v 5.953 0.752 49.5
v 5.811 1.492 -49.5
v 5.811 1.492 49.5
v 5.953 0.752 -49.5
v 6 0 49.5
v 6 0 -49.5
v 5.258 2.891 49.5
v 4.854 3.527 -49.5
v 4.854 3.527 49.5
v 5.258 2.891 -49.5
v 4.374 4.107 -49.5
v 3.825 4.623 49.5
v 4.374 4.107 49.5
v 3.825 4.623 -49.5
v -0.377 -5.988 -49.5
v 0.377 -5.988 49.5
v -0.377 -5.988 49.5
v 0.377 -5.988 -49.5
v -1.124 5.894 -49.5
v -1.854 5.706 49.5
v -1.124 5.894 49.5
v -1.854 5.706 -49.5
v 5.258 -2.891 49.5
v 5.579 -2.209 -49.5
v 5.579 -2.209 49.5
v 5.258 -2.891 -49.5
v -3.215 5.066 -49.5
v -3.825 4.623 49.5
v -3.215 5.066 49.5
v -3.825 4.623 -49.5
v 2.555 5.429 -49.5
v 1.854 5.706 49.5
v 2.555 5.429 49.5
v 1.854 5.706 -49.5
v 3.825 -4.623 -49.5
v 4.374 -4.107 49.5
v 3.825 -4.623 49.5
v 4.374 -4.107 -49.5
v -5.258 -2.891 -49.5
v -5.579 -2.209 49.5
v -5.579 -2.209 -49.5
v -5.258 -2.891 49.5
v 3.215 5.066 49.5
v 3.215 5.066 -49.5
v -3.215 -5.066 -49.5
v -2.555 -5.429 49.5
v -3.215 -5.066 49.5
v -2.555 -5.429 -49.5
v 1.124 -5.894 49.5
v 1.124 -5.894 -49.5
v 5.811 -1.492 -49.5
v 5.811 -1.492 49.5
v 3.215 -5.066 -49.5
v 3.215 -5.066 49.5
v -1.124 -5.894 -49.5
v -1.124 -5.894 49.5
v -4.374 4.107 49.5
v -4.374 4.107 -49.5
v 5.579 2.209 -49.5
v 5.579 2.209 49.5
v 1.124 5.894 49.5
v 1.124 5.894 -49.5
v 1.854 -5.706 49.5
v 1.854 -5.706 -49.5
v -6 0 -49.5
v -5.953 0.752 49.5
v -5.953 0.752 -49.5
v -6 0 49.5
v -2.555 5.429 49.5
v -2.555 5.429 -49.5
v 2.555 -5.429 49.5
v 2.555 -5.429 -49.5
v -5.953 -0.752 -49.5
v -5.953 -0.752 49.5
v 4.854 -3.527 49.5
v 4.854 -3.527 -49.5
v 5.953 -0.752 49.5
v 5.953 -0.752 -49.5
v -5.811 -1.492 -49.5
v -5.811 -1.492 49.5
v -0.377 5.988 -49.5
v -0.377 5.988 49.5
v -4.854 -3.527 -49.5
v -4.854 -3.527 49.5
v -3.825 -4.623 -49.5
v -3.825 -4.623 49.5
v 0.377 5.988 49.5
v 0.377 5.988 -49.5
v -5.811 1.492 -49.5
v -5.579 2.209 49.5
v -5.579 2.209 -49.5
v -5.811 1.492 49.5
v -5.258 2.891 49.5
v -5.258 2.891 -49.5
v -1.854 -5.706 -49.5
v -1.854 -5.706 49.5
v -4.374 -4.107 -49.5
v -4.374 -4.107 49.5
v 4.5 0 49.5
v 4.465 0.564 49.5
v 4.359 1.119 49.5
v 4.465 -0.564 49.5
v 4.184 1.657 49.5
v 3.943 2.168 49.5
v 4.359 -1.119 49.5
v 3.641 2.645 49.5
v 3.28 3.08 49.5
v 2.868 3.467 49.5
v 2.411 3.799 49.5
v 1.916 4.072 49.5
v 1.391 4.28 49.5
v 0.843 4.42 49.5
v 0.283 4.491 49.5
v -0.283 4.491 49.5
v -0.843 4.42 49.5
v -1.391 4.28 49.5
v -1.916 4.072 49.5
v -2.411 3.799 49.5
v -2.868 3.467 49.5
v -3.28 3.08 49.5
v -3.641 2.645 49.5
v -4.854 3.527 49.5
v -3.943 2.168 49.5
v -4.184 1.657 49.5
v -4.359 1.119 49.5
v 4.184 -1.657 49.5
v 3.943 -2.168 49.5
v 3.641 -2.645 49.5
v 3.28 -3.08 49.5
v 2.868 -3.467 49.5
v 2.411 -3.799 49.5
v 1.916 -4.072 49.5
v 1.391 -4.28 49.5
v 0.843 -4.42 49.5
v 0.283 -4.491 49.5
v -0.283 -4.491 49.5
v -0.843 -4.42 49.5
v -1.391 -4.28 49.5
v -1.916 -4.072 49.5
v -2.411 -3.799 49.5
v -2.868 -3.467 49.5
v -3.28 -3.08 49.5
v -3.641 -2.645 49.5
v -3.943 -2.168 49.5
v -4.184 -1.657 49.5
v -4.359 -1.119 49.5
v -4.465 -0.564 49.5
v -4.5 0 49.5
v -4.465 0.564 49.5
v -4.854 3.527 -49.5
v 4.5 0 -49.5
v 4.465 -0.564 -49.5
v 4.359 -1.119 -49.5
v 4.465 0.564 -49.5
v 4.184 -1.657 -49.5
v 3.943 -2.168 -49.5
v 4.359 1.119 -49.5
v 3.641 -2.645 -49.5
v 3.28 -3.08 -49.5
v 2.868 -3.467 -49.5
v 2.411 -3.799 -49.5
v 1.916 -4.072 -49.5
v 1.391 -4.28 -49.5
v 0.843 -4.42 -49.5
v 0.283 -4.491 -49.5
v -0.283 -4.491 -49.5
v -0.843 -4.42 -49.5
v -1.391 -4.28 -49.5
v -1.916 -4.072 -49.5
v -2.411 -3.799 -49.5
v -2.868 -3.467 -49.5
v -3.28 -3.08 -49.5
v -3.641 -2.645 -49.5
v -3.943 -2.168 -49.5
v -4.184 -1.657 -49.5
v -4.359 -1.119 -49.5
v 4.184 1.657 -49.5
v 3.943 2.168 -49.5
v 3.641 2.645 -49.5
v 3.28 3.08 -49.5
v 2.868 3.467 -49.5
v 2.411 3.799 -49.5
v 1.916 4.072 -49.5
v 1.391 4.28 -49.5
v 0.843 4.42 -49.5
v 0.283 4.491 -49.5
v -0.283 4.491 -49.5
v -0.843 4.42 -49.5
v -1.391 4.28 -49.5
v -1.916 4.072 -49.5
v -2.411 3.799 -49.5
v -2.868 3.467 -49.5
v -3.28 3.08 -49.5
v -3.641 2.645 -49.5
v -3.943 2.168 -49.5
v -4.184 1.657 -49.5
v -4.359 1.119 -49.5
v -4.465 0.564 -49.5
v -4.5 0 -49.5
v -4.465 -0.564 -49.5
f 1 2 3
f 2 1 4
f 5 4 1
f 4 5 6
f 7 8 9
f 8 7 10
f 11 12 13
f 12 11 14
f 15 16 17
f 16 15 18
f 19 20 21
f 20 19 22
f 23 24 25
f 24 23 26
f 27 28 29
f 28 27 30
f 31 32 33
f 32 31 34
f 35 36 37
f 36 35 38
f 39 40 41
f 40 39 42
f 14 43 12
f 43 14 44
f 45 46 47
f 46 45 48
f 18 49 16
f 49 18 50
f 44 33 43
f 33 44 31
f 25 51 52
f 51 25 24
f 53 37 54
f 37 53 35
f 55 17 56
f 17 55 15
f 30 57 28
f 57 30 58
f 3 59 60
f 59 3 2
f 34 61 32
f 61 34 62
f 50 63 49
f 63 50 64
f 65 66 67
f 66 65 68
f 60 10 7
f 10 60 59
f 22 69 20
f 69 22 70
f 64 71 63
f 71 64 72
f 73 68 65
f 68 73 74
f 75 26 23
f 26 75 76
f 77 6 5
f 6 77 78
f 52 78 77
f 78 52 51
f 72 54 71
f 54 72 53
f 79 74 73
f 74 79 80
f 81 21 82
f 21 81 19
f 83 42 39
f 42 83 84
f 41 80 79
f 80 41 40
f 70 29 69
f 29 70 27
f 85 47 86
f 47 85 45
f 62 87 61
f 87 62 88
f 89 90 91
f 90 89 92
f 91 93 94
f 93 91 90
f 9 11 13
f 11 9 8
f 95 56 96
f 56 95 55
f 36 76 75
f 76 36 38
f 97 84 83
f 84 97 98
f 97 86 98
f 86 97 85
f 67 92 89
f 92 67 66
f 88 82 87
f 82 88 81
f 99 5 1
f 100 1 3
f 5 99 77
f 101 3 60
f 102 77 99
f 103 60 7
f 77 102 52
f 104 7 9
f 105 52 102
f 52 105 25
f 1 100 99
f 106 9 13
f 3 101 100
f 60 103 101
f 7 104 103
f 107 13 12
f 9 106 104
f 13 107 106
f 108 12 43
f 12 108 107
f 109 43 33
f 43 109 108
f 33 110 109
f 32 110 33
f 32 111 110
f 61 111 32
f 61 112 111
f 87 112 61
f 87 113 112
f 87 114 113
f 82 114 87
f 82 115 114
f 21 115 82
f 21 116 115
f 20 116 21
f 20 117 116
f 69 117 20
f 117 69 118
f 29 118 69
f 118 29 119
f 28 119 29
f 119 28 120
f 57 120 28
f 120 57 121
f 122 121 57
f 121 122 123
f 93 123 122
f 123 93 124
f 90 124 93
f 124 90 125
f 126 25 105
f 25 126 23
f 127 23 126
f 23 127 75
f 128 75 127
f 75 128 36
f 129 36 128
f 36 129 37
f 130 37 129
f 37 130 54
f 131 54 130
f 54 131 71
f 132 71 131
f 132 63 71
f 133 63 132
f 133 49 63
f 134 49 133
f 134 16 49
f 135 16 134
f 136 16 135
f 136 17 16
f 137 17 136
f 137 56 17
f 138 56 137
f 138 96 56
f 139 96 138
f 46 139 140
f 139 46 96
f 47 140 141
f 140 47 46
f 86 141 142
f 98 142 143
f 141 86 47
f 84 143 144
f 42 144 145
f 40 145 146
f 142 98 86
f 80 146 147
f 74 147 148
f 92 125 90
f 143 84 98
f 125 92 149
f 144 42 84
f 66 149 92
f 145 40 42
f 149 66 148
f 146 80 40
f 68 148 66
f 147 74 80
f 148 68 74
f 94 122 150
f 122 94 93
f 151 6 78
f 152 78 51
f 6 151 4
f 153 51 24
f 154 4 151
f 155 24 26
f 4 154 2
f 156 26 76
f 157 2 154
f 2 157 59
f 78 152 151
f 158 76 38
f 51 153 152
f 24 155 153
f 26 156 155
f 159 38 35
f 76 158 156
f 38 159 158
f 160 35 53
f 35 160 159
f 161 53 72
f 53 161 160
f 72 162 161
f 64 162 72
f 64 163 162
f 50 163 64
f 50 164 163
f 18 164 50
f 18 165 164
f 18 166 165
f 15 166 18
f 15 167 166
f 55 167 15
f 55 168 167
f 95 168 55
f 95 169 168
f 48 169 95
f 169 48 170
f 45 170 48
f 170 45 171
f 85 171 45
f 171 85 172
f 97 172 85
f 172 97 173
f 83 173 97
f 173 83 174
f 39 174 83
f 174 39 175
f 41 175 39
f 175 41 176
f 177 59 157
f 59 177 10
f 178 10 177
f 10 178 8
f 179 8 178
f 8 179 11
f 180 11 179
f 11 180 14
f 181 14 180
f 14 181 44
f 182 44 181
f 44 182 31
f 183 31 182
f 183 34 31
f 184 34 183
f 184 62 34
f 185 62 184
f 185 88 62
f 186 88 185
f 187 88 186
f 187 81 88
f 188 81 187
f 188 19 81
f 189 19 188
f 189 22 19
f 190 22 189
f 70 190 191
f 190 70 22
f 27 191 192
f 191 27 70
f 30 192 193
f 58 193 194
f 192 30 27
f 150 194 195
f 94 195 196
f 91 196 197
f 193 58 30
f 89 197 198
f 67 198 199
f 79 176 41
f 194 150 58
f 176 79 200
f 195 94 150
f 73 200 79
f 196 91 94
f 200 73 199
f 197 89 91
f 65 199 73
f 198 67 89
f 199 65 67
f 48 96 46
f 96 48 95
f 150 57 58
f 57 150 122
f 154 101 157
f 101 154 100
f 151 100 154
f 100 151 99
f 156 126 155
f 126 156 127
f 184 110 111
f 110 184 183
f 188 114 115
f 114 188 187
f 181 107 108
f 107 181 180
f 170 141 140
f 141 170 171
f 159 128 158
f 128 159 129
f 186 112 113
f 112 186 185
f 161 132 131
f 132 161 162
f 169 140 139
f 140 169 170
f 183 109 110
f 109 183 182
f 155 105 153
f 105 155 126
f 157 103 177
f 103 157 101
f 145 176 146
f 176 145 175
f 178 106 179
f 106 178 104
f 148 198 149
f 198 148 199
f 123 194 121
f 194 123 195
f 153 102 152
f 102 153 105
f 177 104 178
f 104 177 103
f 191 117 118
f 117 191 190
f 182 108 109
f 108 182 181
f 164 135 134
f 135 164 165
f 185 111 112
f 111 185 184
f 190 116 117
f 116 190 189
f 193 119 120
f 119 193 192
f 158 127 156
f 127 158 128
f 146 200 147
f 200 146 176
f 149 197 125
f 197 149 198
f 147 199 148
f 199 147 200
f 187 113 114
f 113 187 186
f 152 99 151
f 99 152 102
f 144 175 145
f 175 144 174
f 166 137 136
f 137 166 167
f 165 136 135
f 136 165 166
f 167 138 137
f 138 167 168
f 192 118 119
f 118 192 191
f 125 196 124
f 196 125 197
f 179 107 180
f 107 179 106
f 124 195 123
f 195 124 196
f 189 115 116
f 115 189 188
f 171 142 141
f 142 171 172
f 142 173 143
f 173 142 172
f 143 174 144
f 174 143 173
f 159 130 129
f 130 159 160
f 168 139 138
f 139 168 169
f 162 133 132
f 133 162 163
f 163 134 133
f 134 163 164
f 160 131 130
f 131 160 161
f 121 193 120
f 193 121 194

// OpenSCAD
$fn = 50;


difference() {
	union() {
		translate(v = [0, 0, -49.5000000000]) {
			cylinder(h = 99, r = 6.0000000000);
		}
	}
	union() {
		translate(v = [0, 0, -100.0000000000]) {
			cylinder(h = 200, r = 4.5000000000);
		}
	}
}
